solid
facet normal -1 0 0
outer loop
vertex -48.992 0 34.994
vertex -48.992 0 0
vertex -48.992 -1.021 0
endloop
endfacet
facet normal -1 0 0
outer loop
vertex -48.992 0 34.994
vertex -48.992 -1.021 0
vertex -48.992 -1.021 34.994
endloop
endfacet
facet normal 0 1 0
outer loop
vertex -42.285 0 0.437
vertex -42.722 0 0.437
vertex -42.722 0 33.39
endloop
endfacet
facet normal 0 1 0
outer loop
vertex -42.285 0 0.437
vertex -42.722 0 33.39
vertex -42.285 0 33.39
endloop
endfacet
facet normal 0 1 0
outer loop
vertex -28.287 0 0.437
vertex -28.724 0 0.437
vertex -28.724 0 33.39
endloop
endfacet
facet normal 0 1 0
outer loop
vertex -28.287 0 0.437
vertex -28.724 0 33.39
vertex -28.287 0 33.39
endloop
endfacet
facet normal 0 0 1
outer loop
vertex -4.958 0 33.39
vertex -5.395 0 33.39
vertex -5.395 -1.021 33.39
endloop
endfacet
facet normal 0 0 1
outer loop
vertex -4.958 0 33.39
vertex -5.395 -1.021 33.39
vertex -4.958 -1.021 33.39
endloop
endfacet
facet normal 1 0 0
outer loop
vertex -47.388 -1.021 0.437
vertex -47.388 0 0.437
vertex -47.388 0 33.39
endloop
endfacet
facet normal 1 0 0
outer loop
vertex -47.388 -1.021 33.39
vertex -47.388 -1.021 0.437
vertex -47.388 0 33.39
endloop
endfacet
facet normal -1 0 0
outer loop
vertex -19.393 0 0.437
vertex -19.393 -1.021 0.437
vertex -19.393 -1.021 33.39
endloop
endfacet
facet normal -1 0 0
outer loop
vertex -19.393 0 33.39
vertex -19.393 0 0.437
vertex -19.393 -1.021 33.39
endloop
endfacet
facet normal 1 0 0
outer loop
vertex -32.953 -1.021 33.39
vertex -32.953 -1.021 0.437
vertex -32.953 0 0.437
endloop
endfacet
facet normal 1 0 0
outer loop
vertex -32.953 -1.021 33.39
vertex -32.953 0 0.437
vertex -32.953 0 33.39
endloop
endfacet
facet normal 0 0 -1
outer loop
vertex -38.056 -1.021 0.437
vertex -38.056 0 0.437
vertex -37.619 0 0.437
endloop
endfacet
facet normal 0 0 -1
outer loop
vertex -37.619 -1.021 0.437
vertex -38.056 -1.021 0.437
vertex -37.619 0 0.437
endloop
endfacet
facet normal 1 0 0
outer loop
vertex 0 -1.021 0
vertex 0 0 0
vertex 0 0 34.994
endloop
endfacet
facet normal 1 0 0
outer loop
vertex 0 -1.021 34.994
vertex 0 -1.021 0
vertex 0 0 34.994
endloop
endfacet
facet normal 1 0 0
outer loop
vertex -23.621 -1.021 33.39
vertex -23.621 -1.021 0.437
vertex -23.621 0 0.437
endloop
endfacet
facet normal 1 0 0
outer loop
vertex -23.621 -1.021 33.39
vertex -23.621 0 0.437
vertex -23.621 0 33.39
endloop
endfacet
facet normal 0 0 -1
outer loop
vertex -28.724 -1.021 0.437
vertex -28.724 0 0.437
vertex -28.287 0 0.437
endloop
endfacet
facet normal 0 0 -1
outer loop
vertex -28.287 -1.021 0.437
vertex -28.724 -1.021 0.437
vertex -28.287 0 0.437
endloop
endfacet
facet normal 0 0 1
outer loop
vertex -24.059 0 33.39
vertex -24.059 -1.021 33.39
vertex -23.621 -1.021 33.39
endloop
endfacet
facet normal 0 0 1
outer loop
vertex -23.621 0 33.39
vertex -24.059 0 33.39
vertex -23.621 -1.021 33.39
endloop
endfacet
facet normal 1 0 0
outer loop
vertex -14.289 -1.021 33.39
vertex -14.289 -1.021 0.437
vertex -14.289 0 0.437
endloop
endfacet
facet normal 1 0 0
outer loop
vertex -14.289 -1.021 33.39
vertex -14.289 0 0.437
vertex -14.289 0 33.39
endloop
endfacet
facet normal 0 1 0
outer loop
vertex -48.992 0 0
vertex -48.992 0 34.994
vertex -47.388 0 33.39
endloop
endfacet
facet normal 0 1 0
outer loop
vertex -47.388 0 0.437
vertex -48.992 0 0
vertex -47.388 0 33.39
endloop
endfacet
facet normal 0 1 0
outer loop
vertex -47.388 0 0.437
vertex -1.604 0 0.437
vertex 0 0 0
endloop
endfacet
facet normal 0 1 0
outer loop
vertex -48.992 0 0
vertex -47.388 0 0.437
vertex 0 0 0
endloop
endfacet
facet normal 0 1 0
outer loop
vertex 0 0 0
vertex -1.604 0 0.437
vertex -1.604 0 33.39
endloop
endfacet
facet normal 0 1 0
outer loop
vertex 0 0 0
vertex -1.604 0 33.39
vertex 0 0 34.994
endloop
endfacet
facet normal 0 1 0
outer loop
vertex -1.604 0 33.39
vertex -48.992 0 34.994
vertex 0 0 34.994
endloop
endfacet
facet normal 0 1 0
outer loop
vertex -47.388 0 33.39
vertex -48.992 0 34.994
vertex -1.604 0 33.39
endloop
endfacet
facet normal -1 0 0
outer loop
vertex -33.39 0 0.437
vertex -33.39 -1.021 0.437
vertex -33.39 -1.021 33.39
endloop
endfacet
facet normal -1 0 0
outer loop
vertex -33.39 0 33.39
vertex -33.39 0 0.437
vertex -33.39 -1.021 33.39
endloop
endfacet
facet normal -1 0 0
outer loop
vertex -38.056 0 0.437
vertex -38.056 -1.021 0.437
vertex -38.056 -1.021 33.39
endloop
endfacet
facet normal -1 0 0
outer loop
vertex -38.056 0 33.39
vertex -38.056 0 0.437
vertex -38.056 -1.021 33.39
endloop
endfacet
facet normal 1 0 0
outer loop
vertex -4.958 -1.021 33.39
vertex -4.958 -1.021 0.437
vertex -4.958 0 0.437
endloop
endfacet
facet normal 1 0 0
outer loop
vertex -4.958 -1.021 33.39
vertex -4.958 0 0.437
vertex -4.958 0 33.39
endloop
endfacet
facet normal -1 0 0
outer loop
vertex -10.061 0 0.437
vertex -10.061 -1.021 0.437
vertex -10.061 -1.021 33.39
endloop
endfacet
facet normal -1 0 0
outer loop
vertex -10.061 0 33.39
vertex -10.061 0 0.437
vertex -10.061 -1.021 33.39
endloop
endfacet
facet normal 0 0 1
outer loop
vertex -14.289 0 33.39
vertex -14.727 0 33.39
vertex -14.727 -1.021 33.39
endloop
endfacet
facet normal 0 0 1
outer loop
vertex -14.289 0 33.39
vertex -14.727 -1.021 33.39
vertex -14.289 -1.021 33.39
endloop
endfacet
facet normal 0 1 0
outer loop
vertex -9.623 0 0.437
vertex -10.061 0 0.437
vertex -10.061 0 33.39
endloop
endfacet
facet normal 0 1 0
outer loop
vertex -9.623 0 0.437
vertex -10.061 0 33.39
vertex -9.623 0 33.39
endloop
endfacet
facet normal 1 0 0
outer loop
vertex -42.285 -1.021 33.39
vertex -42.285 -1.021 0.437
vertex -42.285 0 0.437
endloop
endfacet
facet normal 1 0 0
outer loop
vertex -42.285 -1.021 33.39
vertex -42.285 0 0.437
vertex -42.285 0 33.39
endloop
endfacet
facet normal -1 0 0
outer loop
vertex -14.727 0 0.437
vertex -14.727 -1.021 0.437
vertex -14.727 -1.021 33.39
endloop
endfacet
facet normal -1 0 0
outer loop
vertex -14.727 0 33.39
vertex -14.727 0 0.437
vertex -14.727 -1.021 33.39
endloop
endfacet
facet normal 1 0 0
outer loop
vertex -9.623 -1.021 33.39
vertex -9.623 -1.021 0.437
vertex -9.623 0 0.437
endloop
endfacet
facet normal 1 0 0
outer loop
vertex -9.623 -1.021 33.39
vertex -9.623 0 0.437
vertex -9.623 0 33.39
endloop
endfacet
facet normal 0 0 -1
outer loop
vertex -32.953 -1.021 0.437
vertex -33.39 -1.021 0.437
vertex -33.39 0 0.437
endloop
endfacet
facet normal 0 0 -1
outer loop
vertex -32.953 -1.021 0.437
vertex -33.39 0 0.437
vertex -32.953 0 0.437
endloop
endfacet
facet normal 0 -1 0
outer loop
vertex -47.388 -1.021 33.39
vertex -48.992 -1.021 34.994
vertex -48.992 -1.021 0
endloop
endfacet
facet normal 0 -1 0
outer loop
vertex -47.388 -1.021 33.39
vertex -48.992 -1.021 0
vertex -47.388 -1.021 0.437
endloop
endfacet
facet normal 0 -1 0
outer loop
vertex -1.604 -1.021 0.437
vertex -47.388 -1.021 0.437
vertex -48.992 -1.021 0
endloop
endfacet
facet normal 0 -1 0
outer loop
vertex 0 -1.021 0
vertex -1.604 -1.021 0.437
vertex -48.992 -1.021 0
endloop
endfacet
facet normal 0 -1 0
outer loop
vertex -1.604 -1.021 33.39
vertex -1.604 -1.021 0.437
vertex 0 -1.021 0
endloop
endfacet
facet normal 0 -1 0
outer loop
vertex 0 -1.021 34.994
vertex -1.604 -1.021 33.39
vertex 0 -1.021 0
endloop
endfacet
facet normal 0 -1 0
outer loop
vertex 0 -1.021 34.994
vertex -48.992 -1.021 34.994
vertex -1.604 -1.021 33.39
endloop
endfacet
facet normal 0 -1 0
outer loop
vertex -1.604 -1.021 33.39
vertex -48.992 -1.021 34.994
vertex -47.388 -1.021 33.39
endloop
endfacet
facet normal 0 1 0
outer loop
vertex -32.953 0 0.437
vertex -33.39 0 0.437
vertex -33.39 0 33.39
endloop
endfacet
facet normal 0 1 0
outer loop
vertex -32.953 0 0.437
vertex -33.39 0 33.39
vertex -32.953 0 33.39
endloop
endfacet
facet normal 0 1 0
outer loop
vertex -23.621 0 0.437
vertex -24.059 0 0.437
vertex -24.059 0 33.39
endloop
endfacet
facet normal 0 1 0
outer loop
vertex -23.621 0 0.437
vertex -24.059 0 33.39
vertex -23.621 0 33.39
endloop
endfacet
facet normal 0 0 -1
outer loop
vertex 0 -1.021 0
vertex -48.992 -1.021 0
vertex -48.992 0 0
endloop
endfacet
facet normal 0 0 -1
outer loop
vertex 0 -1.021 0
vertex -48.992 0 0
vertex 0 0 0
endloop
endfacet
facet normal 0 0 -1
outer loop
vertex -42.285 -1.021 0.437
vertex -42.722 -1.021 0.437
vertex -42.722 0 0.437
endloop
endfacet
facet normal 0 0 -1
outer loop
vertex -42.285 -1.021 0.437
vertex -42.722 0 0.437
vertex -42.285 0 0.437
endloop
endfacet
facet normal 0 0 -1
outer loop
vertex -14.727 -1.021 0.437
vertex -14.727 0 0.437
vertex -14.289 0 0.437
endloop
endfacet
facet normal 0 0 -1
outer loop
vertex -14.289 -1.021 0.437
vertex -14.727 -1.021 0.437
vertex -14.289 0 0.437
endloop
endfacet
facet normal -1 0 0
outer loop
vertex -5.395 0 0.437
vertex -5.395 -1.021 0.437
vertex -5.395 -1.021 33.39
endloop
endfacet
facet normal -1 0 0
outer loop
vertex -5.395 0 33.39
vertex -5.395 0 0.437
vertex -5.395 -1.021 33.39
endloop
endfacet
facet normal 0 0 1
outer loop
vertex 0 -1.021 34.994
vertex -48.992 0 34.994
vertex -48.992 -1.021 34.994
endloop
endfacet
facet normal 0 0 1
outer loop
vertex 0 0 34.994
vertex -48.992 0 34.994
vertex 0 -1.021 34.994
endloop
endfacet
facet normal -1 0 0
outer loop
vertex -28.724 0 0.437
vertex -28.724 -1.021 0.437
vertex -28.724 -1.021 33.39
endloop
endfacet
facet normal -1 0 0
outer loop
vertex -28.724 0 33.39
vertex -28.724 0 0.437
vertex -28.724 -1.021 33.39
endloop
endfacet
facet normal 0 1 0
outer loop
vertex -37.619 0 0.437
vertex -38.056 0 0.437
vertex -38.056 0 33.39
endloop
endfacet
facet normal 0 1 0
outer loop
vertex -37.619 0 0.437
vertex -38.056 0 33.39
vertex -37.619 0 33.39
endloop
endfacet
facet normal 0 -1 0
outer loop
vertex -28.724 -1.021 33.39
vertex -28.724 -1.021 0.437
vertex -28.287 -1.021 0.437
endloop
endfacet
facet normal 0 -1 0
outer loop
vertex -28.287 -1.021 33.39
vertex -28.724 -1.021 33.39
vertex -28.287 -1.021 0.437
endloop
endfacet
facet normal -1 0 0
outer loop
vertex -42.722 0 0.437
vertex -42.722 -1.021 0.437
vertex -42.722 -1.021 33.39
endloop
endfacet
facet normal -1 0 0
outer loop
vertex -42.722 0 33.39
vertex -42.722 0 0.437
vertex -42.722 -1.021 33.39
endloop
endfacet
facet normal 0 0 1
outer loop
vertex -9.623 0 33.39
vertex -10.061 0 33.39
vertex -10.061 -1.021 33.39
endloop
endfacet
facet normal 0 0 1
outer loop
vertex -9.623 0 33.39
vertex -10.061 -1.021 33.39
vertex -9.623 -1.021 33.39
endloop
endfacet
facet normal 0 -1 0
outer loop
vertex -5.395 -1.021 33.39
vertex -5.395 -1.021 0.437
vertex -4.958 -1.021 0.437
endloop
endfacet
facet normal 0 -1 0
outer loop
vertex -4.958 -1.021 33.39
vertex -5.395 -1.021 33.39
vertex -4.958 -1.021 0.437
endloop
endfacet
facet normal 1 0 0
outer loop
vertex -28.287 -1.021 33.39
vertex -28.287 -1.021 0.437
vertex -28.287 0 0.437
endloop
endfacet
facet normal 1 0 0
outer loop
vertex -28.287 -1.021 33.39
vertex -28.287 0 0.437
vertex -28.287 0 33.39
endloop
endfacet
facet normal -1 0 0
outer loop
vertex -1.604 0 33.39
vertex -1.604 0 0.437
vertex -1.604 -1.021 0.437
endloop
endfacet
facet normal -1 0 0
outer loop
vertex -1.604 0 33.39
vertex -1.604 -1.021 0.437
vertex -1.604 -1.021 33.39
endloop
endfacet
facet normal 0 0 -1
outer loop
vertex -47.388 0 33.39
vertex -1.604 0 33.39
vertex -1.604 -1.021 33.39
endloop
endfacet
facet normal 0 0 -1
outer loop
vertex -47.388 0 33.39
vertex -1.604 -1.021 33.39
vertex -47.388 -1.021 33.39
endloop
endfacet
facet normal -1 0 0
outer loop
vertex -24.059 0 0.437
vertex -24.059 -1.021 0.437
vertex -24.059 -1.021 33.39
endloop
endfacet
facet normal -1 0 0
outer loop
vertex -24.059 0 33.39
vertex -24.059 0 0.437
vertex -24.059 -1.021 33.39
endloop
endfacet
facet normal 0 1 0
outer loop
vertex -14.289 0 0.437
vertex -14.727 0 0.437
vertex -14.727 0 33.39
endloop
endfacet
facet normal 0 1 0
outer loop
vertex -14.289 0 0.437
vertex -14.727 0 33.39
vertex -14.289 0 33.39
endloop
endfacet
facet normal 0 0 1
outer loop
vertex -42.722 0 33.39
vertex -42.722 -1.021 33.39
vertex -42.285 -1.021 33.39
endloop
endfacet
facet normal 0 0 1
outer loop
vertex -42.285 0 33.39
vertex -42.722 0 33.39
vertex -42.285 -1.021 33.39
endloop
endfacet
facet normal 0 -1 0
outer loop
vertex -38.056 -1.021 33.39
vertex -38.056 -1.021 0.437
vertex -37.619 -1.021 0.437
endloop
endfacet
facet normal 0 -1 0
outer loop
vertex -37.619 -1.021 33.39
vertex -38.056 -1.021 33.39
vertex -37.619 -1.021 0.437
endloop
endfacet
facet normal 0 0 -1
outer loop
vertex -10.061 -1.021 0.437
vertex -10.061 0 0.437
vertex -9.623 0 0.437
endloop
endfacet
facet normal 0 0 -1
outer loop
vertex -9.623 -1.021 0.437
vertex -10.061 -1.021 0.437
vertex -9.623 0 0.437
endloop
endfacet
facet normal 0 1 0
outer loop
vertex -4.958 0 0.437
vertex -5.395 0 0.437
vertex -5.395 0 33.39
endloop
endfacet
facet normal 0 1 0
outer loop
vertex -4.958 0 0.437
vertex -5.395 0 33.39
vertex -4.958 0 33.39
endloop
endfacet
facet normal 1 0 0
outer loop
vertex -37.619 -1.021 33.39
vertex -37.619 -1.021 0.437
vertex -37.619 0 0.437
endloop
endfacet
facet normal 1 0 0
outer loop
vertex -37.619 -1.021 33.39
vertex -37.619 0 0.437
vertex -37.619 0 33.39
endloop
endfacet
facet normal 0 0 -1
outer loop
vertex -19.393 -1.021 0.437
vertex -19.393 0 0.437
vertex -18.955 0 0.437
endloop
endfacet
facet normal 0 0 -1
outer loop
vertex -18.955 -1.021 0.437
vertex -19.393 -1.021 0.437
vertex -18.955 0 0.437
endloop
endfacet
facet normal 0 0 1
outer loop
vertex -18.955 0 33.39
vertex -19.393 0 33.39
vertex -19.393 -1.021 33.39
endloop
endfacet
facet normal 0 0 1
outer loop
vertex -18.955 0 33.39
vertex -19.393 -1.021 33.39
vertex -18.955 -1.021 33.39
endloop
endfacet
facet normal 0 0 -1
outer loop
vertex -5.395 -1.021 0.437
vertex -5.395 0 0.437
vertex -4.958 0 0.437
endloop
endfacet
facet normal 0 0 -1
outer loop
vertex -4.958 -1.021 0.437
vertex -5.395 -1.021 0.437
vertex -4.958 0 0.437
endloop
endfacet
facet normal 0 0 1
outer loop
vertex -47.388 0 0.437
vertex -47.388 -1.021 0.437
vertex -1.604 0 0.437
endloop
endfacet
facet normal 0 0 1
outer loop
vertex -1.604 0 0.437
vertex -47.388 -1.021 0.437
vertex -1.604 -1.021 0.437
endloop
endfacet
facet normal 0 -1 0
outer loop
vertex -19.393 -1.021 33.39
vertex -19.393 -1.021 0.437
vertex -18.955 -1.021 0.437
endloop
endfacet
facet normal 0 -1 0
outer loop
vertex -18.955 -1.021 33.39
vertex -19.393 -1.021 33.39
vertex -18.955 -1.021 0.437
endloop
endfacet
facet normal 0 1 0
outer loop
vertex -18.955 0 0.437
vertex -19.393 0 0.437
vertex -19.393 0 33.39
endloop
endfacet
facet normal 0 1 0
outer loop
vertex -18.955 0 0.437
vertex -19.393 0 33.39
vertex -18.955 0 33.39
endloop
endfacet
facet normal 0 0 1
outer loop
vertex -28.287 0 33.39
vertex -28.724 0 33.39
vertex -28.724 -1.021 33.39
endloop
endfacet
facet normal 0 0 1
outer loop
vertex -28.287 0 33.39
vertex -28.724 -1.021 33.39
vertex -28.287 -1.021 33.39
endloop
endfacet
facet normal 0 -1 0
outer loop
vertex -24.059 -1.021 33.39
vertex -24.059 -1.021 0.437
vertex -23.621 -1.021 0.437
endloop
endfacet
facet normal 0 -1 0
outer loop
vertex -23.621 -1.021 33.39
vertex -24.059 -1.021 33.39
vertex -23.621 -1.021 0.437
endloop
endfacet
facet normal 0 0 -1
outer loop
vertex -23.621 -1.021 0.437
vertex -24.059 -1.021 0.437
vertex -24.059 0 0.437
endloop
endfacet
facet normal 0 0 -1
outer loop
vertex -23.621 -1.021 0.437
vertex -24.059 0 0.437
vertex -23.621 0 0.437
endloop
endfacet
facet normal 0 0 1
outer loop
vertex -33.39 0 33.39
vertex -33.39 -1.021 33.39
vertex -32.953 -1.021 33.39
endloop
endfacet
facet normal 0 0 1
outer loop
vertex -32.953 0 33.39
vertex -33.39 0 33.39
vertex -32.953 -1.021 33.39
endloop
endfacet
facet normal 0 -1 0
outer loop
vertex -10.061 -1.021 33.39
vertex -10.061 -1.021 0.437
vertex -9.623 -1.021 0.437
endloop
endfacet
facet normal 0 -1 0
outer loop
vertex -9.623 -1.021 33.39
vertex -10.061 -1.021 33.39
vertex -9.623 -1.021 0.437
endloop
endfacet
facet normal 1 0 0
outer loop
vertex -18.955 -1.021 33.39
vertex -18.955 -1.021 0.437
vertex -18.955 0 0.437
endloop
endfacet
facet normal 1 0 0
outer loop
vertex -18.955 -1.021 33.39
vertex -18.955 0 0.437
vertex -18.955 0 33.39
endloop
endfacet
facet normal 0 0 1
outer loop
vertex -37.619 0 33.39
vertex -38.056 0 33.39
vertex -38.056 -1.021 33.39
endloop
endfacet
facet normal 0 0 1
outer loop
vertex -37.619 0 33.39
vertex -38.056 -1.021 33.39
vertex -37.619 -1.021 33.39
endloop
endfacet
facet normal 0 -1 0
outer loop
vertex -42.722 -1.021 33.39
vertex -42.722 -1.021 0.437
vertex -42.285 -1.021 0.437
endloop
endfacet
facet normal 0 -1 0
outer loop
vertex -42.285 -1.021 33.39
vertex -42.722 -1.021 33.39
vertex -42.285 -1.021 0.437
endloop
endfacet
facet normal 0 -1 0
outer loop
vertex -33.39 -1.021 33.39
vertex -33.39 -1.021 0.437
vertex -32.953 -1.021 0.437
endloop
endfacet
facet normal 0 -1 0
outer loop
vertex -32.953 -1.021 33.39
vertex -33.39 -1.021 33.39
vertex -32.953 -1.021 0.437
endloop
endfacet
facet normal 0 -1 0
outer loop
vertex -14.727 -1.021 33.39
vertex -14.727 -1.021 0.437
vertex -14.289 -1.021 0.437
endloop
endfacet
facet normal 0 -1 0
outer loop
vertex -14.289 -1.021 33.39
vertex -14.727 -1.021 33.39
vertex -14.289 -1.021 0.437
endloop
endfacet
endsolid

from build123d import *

# Parameters (mm, degrees)
F0_W     = 4267.2
F0_H     = 3048
F1_DEPTH = 88.9
F2_W     = 3987.8
F2_H     = 2908.3
F3_DEPTH = 88.901
F4_W     = 3987.8
F4_H     = 38.1
F5_DEPTH = 88.9
F6_W     = 38.1
F6_H     = 2870.2
F7_DEPTH = 88.9
F8_SCALE = 0.0114810563


with BuildPart() as f1:
    # F0 (on Front) → F1 (new body)
    with BuildSketch(Plane.XZ):
        with Locations((-2133.6, 1524)):
            Rectangle(F0_W, F0_H)
    extrude(amount=F1_DEPTH)

    # F2 (on face) → F3 (cut, through all)
    with BuildSketch(Plane(origin=(0, 0, 0), x_dir=(-1, 0, 0), z_dir=(0, 1, 0))):
        with Locations((2133.6, 1454.15)):
            Rectangle(F2_W, F2_H)
    extrude(amount=-F3_DEPTH, mode=Mode.SUBTRACT)

    # F4 (on face) → F5 (join)
    with BuildSketch(Plane.XZ.offset(88.9)):
        with Locations((-2133.6, 19.05)):
            Rectangle(F4_W, F4_H)
    extrude(amount=-F5_DEPTH)


with BuildPart() as f7:
    # F6 (on face) → F7 (new body)
    with BuildSketch(Plane.XZ.offset(88.9)):
        with Locations((-3702.05, 1473.2)):
            Rectangle(F6_W, F6_H)
    extrude(amount=-F7_DEPTH)


with BuildPart() as f7b:
    # F6 (on face) → F7, piece 2 (new body)
    with BuildSketch(Plane.XZ.offset(88.9)):
        with Locations((-3295.65, 1473.2)):
            Rectangle(F6_W, F6_H)
    extrude(amount=-F7_DEPTH)


with BuildPart() as f7c:
    # F6 (on face) → F7, piece 3 (new body)
    with BuildSketch(Plane.XZ.offset(88.9)):
        with Locations((-2889.25, 1473.2)):
            Rectangle(F6_W, F6_H)
    extrude(amount=-F7_DEPTH)


with BuildPart() as f7d:
    # F6 (on face) → F7, piece 4 (new body)
    with BuildSketch(Plane.XZ.offset(88.9)):
        with Locations((-2482.85, 1473.2)):
            Rectangle(F6_W, F6_H)
    extrude(amount=-F7_DEPTH)


with BuildPart() as f7e:
    # F6 (on face) → F7, piece 5 (new body)
    with BuildSketch(Plane.XZ.offset(88.9)):
        with Locations((-2076.45, 1473.2)):
            Rectangle(F6_W, F6_H)
    extrude(amount=-F7_DEPTH)


with BuildPart() as f7f:
    # F6 (on face) → F7, piece 6 (new body)
    with BuildSketch(Plane.XZ.offset(88.9)):
        with Locations((-1670.05, 1473.2)):
            Rectangle(F6_W, F6_H)
    extrude(amount=-F7_DEPTH)


with BuildPart() as f7g:
    # F6 (on face) → F7, piece 7 (new body)
    with BuildSketch(Plane.XZ.offset(88.9)):
        with Locations((-1263.65, 1473.2)):
            Rectangle(F6_W, F6_H)
    extrude(amount=-F7_DEPTH)


with BuildPart() as f7h:
    # F6 (on face) → F7, piece 8 (new body)
    with BuildSketch(Plane.XZ.offset(88.9)):
        with Locations((-857.25, 1473.2)):
            Rectangle(F6_W, F6_H)
    extrude(amount=-F7_DEPTH)


with BuildPart() as f7i:
    # F6 (on face) → F7, piece 9 (new body)
    with BuildSketch(Plane.XZ.offset(88.9)):
        with Locations((-450.85, 1473.2)):
            Rectangle(F6_W, F6_H)
    extrude(amount=-F7_DEPTH)


with BuildPart() as f7g_1:
    # F8: moved
    add(f7g.part.scale(F8_SCALE))


with BuildPart() as f7i_1:
    # F8: moved
    add(f7i.part.scale(F8_SCALE))


with BuildPart() as f7f_1:
    # F8: moved
    add(f7f.part.scale(F8_SCALE))


with BuildPart() as f7d_1:
    # F8: moved
    add(f7d.part.scale(F8_SCALE))


with BuildPart() as f7e_1:
    # F8: moved
    add(f7e.part.scale(F8_SCALE))


with BuildPart() as f7c_1:
    # F8: moved
    add(f7c.part.scale(F8_SCALE))


with BuildPart() as f7_1:
    # F8: moved
    add(f7.part.scale(F8_SCALE))


with BuildPart() as f1_1:
    # F8: moved
    add(f1.part.scale(F8_SCALE))


with BuildPart() as f7h_1:
    # F8: moved
    add(f7h.part.scale(F8_SCALE))


with BuildPart() as f7b_1:
    # F8: moved
    add(f7b.part.scale(F8_SCALE))


solid = Compound([f7g_1.part, f7i_1.part, f7f_1.part, f7d_1.part, f7e_1.part, f7c_1.part, f7_1.part, f1_1.part, f7h_1.part, f7b_1.part])
